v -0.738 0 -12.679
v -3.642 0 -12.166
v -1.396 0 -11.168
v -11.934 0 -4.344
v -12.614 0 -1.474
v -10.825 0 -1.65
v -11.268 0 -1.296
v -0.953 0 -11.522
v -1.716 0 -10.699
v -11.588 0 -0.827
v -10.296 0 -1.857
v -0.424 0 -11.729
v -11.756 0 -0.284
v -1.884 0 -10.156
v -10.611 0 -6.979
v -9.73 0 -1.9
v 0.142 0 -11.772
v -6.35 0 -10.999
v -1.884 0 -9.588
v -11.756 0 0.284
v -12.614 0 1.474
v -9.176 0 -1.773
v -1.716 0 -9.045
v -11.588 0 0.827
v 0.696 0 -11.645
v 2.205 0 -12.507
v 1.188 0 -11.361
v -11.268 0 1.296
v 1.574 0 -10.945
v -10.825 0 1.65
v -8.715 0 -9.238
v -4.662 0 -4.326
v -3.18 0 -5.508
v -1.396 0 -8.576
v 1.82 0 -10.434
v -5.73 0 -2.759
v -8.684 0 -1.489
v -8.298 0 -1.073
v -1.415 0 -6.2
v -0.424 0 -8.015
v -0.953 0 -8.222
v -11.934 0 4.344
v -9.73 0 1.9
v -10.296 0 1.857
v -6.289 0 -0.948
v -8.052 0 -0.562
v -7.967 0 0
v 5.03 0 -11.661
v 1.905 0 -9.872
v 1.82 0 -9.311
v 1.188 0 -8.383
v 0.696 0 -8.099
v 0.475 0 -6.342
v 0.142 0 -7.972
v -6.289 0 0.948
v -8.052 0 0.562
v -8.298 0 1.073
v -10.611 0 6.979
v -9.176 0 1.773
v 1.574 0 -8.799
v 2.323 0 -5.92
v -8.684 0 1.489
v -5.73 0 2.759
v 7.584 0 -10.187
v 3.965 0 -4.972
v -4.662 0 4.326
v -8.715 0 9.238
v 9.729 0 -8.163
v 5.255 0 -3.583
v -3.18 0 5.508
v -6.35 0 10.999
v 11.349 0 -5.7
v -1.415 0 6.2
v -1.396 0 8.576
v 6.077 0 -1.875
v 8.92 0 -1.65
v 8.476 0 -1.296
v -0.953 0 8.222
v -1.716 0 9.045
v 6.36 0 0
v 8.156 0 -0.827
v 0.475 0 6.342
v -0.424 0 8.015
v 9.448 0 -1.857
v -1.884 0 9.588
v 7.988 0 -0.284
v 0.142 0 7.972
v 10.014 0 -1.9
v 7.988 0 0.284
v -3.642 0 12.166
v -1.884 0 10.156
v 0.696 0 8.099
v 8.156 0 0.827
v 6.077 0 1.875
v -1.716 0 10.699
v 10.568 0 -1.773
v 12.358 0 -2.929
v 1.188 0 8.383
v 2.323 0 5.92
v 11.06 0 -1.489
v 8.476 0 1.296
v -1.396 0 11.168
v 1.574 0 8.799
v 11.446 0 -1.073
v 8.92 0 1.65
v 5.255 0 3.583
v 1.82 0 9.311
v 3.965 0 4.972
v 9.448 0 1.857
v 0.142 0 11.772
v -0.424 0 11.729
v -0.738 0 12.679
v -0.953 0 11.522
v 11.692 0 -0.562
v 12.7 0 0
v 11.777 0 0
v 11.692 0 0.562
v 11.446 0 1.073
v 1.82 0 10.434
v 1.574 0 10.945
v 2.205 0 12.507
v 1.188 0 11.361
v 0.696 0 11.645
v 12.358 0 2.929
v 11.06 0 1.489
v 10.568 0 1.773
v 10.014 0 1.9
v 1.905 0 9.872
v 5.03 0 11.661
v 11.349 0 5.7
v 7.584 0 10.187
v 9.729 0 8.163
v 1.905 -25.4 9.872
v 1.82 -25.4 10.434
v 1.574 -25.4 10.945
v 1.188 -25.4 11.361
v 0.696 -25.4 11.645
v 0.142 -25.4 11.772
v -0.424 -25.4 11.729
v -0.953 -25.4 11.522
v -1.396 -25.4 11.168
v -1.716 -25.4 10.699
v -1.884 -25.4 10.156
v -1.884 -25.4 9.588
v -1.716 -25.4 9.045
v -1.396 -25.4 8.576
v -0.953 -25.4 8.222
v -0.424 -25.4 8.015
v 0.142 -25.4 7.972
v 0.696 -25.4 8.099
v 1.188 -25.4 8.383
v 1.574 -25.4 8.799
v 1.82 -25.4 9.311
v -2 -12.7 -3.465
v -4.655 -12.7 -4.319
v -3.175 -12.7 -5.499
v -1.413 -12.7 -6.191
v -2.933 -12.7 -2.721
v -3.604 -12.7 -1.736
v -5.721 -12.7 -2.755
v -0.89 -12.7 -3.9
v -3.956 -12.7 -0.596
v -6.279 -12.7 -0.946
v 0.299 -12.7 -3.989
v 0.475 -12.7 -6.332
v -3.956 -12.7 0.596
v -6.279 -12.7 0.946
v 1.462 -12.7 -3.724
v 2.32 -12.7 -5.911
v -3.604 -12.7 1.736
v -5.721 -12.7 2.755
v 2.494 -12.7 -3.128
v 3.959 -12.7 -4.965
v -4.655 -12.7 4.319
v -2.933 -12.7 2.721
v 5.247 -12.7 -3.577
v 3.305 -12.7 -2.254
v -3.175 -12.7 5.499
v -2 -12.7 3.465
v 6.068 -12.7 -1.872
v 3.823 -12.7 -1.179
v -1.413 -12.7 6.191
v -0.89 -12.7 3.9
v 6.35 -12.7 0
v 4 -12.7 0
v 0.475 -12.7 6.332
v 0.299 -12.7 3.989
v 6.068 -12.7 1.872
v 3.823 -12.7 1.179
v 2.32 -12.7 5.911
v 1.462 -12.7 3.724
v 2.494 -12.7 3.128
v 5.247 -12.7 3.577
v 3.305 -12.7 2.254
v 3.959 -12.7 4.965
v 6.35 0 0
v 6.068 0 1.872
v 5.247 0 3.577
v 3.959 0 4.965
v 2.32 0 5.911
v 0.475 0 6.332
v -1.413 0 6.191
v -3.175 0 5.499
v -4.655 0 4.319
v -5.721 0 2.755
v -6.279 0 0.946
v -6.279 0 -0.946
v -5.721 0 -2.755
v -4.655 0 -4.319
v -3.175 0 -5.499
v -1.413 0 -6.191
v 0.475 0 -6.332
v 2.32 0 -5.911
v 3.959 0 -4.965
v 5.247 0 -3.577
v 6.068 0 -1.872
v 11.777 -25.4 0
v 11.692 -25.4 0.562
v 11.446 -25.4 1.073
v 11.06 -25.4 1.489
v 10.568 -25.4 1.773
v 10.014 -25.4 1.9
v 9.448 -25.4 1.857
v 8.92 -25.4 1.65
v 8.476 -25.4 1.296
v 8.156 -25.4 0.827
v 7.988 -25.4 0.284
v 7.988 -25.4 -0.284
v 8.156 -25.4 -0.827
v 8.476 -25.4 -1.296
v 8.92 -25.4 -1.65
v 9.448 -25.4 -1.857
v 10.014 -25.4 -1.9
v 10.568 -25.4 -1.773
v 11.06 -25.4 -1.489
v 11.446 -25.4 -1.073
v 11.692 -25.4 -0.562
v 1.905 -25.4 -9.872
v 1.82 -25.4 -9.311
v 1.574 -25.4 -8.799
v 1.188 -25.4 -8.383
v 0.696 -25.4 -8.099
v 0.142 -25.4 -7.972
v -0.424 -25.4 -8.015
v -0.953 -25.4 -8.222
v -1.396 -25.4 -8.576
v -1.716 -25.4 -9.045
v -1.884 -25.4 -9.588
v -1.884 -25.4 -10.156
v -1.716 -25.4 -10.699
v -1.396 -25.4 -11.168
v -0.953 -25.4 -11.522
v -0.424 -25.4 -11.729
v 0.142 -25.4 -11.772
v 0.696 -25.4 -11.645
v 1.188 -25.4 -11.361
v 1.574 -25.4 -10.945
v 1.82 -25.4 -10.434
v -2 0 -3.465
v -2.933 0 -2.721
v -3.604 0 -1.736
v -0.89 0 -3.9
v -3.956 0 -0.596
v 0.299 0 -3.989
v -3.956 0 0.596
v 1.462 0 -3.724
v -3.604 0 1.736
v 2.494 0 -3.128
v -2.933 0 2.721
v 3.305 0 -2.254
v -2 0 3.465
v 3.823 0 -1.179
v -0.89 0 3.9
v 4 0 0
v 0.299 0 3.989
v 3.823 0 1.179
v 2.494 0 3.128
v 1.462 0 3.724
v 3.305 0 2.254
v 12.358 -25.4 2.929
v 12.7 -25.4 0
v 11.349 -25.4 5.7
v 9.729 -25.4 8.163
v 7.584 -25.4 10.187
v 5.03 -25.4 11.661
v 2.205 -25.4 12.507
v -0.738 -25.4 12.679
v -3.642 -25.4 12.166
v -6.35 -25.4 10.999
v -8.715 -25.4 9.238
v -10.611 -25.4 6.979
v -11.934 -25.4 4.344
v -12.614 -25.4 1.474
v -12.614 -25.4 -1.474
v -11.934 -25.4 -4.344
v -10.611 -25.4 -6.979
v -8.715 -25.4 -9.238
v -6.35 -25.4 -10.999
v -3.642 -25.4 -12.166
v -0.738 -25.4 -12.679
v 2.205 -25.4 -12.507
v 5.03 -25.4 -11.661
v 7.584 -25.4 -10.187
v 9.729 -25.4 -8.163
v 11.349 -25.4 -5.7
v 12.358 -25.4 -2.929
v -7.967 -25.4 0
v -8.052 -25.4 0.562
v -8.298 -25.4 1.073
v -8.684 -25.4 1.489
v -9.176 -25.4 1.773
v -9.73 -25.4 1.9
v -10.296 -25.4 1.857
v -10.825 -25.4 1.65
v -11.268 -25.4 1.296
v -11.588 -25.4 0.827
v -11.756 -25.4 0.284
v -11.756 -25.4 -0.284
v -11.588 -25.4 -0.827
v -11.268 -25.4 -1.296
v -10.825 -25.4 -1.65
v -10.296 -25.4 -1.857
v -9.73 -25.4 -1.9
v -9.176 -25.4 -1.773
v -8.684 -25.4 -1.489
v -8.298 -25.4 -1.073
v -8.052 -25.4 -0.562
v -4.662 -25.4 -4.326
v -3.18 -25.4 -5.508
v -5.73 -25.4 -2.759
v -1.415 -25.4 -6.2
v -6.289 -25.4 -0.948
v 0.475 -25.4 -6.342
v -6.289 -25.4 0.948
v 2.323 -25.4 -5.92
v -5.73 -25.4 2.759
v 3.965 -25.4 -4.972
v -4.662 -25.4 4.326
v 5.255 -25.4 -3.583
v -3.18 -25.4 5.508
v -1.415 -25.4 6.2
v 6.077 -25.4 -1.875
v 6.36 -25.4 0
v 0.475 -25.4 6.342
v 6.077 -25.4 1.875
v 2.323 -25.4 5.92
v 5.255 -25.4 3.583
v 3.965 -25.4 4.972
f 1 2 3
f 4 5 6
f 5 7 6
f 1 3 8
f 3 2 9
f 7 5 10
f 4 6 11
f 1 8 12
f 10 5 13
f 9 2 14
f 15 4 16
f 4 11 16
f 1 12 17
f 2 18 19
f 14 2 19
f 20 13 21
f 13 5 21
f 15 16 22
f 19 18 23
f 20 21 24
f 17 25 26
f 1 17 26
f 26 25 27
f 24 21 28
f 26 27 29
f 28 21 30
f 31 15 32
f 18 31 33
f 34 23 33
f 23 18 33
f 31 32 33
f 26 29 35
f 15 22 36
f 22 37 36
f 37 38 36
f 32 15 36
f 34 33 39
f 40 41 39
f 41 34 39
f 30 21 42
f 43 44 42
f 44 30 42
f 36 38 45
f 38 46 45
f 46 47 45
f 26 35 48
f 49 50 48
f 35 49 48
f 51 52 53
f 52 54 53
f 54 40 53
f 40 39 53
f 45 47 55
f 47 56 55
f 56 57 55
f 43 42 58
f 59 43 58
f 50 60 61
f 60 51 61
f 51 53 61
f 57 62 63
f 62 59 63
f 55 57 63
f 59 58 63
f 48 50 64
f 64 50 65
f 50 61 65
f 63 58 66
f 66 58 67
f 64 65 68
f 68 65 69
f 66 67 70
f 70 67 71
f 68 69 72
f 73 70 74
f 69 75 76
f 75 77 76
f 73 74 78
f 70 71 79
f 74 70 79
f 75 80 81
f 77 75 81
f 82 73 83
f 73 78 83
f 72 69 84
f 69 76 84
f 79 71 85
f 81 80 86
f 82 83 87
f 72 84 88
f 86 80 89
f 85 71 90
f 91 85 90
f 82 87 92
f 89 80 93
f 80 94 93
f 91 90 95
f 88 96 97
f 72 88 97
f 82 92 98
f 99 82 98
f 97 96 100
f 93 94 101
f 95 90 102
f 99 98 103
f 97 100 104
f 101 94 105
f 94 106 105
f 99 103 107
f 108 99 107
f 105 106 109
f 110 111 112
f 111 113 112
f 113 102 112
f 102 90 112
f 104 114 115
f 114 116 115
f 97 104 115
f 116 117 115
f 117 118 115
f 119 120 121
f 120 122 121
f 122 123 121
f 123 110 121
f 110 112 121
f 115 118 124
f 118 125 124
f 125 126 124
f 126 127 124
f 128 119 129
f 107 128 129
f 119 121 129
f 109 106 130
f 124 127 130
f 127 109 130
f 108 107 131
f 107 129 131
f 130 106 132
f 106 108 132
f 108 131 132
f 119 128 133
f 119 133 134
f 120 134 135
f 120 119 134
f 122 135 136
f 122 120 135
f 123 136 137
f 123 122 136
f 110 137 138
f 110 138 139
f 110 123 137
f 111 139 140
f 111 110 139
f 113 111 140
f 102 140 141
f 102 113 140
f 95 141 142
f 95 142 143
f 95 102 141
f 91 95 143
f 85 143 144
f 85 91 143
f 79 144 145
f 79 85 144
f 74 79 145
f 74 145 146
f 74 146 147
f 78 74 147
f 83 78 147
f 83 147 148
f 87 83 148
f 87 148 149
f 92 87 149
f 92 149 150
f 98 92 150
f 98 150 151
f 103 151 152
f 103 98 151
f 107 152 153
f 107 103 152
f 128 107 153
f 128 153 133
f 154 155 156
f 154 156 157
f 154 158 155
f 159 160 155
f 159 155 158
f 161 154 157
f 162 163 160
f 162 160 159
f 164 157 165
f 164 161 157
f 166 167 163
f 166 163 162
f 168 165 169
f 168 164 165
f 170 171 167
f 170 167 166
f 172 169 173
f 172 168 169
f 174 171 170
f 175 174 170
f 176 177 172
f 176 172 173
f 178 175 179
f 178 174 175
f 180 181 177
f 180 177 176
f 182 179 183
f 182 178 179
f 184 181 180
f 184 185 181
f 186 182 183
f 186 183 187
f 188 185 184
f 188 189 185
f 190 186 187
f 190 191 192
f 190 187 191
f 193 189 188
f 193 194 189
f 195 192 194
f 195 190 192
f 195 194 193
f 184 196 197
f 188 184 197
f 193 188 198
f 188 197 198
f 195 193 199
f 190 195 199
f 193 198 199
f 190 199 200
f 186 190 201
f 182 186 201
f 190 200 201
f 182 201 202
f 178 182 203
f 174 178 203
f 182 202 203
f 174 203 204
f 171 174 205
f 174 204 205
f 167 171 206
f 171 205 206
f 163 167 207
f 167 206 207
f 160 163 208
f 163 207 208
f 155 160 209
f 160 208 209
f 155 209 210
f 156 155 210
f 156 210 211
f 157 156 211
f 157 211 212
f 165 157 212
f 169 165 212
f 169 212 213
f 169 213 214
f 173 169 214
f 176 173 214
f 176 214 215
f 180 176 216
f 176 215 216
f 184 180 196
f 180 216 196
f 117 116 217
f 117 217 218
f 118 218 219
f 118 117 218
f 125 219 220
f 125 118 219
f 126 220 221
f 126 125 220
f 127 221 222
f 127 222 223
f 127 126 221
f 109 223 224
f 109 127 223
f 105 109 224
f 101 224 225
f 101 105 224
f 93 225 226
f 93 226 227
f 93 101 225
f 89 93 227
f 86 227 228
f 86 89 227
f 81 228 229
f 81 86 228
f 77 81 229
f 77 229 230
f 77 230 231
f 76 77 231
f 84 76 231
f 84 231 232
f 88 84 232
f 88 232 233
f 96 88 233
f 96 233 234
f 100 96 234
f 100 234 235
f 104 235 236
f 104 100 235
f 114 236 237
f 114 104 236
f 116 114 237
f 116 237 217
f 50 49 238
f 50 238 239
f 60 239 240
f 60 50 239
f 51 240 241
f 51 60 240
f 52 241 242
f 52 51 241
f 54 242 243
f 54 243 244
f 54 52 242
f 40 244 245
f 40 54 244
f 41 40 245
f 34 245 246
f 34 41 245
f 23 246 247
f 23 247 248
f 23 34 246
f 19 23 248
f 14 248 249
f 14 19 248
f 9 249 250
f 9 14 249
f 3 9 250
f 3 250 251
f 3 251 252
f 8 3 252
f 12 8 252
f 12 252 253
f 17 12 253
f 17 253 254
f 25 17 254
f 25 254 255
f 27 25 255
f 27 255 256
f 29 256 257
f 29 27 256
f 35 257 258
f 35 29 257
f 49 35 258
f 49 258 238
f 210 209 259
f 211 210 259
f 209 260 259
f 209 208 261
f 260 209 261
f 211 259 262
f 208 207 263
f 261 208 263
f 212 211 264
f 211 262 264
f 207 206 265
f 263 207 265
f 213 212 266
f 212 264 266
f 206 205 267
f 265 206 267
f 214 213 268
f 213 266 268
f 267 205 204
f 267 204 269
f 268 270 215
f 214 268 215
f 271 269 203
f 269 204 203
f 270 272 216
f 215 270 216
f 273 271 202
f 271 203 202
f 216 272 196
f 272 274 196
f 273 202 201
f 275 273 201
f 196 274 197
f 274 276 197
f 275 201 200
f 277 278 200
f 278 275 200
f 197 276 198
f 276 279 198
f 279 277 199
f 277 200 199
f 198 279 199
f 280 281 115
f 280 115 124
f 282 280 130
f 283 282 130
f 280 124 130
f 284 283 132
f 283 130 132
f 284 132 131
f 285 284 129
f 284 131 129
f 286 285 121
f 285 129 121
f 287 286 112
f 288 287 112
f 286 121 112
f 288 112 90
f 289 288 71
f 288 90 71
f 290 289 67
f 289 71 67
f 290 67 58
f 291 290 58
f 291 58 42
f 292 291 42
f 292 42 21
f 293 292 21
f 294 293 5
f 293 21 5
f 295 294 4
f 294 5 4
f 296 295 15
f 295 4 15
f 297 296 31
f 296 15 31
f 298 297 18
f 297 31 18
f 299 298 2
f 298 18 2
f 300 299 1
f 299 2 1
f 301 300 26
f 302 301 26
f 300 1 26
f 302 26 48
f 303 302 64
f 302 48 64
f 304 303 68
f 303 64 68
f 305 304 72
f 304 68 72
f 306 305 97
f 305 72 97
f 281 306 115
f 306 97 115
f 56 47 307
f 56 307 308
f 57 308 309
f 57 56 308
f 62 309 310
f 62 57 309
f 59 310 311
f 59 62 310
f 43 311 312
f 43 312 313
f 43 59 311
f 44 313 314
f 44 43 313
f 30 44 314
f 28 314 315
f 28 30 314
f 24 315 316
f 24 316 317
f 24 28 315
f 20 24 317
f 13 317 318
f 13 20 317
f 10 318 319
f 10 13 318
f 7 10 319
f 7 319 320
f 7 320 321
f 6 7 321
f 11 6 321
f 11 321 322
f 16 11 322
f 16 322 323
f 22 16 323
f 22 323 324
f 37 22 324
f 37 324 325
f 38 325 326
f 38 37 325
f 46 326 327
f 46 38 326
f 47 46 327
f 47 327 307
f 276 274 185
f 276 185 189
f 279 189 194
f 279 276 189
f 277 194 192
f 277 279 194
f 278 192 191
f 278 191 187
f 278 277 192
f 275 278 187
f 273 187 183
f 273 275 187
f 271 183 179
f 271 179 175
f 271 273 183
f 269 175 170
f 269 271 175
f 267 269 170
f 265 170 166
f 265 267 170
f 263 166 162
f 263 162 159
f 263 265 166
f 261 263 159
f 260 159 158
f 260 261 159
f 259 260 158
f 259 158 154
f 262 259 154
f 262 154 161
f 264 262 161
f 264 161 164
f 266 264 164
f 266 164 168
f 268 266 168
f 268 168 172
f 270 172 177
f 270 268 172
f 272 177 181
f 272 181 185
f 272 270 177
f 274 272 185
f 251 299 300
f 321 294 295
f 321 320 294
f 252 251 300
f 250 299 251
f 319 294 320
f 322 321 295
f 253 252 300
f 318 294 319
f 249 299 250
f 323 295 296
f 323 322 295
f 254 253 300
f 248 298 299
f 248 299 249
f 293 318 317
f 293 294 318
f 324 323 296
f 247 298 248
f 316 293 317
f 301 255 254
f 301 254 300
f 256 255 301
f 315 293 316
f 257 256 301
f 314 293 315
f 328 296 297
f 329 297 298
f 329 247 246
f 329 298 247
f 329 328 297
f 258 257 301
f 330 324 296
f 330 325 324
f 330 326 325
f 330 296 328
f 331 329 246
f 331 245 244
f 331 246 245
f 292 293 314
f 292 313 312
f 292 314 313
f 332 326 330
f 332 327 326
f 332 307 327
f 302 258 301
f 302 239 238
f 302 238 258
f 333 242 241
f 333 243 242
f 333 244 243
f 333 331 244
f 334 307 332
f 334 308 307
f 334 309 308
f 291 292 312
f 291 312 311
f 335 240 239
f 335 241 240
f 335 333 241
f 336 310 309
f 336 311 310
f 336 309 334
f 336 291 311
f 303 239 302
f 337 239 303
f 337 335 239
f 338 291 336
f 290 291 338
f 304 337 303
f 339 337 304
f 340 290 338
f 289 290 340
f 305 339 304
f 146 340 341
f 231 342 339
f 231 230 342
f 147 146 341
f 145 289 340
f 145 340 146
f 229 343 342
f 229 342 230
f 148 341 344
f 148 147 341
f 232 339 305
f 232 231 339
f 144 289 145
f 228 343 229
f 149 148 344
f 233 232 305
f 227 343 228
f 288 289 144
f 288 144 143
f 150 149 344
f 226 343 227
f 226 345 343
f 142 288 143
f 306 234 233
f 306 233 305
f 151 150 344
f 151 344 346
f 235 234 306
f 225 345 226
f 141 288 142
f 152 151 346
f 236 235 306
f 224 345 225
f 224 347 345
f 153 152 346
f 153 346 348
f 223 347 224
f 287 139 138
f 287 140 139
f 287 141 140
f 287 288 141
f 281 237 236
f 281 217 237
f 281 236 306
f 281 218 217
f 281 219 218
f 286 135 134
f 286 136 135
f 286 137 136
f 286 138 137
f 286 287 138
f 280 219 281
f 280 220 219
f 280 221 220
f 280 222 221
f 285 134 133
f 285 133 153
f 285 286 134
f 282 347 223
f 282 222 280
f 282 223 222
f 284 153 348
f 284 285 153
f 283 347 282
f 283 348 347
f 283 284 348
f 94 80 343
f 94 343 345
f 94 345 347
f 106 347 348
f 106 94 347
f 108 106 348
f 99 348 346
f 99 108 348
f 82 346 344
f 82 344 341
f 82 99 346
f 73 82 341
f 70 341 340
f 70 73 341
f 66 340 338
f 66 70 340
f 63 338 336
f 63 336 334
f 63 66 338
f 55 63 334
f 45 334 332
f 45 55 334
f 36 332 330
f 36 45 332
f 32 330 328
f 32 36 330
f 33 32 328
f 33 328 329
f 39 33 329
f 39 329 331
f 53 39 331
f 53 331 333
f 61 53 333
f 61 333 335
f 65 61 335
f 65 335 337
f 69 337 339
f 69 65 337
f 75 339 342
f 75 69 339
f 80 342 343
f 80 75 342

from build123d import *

# Parameters (mm, degrees)
F0_R     = 12.7
F0_R_2   = 1.905
F0_R_3   = 6.359671
F1_DEPTH = 25.4
F0_R_4   = 6.35
F0_R_5   = 4.0005
F2_DEPTH = 12.7


with BuildPart() as f1:
    # F0 (on Front) → F1 (new body)
    with BuildSketch(Plane.XZ):
        Circle(F0_R)
        with Locations((0, -9.872023)):
            Circle(F0_R_2, mode=Mode.SUBTRACT)
        with Locations((-9.872023, 0)):
            Circle(F0_R_2, mode=Mode.SUBTRACT)
        Circle(F0_R_3, mode=Mode.SUBTRACT)
        with Locations((9.872023, 0)):
            Circle(F0_R_2, mode=Mode.SUBTRACT)
        with Locations((0, 9.872023)):
            Circle(F0_R_2, mode=Mode.SUBTRACT)
    extrude(amount=F1_DEPTH)


with BuildPart() as f2:
    # F0 (on Front) → F2 (new body)
    with BuildSketch(Plane.XZ):
        Circle(F0_R_4)
        Circle(F0_R_5, mode=Mode.SUBTRACT)
    extrude(amount=F2_DEPTH)


solid = Compound([f1.part, f2.part])
